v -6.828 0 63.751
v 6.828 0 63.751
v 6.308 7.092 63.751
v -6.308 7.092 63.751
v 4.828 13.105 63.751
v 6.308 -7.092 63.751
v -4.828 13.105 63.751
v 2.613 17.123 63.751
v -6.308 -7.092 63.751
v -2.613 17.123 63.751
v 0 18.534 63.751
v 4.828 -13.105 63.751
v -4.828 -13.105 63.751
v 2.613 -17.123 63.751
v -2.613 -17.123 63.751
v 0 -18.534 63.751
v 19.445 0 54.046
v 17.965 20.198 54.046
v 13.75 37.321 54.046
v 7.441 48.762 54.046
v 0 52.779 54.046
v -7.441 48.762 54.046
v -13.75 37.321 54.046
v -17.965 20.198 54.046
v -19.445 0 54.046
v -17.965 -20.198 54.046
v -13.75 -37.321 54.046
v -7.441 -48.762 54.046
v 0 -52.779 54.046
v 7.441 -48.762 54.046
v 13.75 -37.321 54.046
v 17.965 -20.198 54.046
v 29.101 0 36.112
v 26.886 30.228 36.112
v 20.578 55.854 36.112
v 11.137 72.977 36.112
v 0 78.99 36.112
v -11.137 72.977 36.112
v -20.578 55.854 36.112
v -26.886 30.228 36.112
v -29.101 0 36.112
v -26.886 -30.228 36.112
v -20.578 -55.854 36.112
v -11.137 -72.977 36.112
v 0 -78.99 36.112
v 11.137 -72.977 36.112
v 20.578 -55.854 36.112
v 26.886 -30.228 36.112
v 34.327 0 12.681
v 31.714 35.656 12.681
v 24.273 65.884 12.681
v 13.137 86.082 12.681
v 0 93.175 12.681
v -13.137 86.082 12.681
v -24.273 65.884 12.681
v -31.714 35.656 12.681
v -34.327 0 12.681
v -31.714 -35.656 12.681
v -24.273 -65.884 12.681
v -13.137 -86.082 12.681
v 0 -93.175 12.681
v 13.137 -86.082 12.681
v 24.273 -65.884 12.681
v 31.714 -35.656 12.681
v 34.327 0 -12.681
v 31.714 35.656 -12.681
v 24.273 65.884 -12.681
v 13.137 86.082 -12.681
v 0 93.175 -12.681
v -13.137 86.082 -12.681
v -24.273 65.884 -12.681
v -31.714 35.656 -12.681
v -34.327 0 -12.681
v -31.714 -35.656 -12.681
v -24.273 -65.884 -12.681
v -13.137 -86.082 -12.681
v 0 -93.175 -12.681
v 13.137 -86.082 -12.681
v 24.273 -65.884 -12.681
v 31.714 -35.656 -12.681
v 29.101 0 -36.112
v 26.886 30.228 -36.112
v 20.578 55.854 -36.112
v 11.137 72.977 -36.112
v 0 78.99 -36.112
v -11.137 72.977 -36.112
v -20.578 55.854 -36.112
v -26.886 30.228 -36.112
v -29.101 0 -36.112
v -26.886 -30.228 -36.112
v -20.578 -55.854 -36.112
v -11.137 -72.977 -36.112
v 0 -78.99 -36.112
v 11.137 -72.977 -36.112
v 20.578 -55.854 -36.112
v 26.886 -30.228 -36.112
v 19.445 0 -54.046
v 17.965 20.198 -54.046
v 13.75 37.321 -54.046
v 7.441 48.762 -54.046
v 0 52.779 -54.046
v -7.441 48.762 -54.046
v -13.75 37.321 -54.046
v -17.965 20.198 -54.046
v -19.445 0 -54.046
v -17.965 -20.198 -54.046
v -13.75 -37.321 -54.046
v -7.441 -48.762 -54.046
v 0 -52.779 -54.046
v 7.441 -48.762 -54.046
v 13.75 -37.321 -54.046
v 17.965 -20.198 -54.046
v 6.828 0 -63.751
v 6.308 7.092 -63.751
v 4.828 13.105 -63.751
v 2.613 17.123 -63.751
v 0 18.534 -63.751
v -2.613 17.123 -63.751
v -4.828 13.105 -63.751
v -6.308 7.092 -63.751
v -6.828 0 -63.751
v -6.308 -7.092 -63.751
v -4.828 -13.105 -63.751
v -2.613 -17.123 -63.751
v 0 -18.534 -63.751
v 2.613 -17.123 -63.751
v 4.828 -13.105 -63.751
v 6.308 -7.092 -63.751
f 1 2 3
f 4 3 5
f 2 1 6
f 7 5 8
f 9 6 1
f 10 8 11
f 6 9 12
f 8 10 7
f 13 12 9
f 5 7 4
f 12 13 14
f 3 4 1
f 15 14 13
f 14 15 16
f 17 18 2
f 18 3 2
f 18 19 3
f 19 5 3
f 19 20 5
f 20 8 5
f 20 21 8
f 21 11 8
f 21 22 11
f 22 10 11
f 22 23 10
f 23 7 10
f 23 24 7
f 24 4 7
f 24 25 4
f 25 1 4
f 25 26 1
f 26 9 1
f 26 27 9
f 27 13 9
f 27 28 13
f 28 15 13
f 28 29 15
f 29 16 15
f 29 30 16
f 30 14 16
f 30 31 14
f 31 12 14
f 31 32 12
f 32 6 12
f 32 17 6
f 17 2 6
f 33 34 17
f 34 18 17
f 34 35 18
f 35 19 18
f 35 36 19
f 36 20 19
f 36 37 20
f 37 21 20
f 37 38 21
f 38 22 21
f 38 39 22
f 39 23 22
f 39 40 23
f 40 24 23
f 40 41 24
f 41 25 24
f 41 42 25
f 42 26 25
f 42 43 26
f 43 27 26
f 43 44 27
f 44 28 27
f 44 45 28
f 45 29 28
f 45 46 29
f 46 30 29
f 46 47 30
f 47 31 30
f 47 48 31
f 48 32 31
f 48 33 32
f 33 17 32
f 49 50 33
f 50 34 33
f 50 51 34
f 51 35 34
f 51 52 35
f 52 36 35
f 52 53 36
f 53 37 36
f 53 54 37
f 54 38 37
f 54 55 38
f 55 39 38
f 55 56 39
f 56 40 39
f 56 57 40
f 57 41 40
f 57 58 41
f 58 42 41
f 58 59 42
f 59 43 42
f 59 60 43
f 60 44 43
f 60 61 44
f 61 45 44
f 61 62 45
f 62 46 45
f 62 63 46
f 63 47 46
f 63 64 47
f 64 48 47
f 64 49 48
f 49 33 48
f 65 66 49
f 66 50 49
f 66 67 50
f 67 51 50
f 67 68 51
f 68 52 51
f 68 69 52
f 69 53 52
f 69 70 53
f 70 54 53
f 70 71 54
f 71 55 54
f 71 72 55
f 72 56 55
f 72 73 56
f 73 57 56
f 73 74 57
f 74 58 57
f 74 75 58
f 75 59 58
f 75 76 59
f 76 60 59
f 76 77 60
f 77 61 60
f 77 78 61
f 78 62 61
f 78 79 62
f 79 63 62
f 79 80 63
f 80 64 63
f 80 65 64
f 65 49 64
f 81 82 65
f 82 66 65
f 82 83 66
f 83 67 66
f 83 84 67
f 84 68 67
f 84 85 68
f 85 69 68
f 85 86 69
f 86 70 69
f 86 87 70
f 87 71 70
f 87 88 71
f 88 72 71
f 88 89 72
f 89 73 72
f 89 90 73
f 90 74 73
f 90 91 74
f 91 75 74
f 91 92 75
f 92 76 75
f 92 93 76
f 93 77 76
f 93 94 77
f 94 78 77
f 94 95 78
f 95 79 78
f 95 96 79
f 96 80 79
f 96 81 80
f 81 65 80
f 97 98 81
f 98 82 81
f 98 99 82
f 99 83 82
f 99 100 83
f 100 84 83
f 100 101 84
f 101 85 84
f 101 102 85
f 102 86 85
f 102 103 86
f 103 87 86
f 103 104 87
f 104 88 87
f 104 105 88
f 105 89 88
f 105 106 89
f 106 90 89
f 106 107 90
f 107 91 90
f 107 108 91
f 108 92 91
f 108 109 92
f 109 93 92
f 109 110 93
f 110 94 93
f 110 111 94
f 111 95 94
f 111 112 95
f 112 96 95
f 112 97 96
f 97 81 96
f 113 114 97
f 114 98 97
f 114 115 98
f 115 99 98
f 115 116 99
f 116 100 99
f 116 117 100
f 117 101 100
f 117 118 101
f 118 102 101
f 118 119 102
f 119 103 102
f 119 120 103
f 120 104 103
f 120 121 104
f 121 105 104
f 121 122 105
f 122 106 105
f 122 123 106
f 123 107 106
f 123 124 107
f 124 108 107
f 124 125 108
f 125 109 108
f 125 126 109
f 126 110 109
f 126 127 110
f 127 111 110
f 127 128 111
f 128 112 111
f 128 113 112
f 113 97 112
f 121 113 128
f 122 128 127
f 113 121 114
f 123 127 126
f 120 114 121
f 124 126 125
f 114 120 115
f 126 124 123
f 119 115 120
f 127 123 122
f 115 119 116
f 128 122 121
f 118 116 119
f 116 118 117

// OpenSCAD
// Generated by SolidPython 1.0.1 on 2020-07-29 00:46:48


scale(v = [7, 19, 13]) {
	sphere(r = 5);
}
/***********************************************
*********      SolidPython code:      **********
************************************************
 
# import packages: SolidPython
from solid import *
from solid.utils import *
from itertools import chain, combinations, permutations


class Resize:

    def __init__(self, scad_file):
        self.scad_file = scad_file
        #self.scad_file = import_scad(scad_file)
        # cone/cylinder param:
        self.r1 = 0
        self.r2 = 0
        self.h = 0
        # rectangular prism param:
        self.w = 0
        self.l = 0
        # ellipse param:
        self.r = 0

    # import OpenScad code (file name corresponds to shape)


    # classify shape + parameters
    def assign(self, param1, param2, param3):
        if self.scad_file == 'cone.scad':
            self.r1 = param1
            self.r2 = param2
            self.h = param3
        elif self.scad_file == 'cylinder.scad':
            self.r1 = param1
            self.r2 = param2
            self.h = param3
        elif self.scad_file == 'rectangularPrism.scad':
            self.h = param1
            self.l = param2
            self.w = param3
        else:
            self.r = param1
            self.h = param2

    # resize parameters
    def iterate(self):
        x = range(3, 20, 2)
        i = 1
        if self.scad_file == 'cone.scad':
            tempList = list(permutations(x, 2))
            for temp in tempList:
                param1 = temp[0]
                param2 = temp[1]
                filepath = 'produced_scad_files/' + 'cone' + str(param1) + '_' + str(param2) + '_' + '.scad'
                scad_render_to_file(cylinder(h=param1, r1=param2, r2=0), filepath)

        elif self.scad_file == 'cylinder.scad':
            tempList = list(permutations(x, 3))
            for temp in tempList:
                param1 = temp[0]
                param2 = temp[1]
                filepath = 'produced_scad_files/' + 'cylinder' + str(param1) + '_' + str(param2) + '_' + '.scad'
                scad_render_to_file(cylinder(h=param1, r1=param2, r2=param2), filepath)

        elif self.scad_file == 'rectangularPrism.scad':
            tempList = list(permutations(x, 3))
            for temp in tempList:
                param1 = temp[0]
                param2 = temp[1]
                param3 = temp[2]
                filepath = 'produced_scad_files/' + 'rectangularPrism' + str(param1) + '_' + str(param2) + '_' + str(
                    param3) + '.scad'
                scad_render_to_file(cube(size=(param1, param2, param3)), filepath)

        elif self.scad_file == 'ellipse.scad':
            tempList = list(permutations(x, 4))
            for temp in tempList:
                param1 = temp[0]
                param2 = temp[1]
                param3 = temp[2]
                param4 = temp[3]
                filepath = 'produced_scad_files/' + 'ellipse' + str(param1) + '_' + str(param2) + '_' + str(param3) + '_' + str(param4) + '.scad'
                scad_render_to_file(scale([param1, param2, param3])(sphere(r=param4)), filepath)

    def render_to_scadfile(self):
        scad_render_to_file(scad, 'example.scad') 
 
************************************************/
